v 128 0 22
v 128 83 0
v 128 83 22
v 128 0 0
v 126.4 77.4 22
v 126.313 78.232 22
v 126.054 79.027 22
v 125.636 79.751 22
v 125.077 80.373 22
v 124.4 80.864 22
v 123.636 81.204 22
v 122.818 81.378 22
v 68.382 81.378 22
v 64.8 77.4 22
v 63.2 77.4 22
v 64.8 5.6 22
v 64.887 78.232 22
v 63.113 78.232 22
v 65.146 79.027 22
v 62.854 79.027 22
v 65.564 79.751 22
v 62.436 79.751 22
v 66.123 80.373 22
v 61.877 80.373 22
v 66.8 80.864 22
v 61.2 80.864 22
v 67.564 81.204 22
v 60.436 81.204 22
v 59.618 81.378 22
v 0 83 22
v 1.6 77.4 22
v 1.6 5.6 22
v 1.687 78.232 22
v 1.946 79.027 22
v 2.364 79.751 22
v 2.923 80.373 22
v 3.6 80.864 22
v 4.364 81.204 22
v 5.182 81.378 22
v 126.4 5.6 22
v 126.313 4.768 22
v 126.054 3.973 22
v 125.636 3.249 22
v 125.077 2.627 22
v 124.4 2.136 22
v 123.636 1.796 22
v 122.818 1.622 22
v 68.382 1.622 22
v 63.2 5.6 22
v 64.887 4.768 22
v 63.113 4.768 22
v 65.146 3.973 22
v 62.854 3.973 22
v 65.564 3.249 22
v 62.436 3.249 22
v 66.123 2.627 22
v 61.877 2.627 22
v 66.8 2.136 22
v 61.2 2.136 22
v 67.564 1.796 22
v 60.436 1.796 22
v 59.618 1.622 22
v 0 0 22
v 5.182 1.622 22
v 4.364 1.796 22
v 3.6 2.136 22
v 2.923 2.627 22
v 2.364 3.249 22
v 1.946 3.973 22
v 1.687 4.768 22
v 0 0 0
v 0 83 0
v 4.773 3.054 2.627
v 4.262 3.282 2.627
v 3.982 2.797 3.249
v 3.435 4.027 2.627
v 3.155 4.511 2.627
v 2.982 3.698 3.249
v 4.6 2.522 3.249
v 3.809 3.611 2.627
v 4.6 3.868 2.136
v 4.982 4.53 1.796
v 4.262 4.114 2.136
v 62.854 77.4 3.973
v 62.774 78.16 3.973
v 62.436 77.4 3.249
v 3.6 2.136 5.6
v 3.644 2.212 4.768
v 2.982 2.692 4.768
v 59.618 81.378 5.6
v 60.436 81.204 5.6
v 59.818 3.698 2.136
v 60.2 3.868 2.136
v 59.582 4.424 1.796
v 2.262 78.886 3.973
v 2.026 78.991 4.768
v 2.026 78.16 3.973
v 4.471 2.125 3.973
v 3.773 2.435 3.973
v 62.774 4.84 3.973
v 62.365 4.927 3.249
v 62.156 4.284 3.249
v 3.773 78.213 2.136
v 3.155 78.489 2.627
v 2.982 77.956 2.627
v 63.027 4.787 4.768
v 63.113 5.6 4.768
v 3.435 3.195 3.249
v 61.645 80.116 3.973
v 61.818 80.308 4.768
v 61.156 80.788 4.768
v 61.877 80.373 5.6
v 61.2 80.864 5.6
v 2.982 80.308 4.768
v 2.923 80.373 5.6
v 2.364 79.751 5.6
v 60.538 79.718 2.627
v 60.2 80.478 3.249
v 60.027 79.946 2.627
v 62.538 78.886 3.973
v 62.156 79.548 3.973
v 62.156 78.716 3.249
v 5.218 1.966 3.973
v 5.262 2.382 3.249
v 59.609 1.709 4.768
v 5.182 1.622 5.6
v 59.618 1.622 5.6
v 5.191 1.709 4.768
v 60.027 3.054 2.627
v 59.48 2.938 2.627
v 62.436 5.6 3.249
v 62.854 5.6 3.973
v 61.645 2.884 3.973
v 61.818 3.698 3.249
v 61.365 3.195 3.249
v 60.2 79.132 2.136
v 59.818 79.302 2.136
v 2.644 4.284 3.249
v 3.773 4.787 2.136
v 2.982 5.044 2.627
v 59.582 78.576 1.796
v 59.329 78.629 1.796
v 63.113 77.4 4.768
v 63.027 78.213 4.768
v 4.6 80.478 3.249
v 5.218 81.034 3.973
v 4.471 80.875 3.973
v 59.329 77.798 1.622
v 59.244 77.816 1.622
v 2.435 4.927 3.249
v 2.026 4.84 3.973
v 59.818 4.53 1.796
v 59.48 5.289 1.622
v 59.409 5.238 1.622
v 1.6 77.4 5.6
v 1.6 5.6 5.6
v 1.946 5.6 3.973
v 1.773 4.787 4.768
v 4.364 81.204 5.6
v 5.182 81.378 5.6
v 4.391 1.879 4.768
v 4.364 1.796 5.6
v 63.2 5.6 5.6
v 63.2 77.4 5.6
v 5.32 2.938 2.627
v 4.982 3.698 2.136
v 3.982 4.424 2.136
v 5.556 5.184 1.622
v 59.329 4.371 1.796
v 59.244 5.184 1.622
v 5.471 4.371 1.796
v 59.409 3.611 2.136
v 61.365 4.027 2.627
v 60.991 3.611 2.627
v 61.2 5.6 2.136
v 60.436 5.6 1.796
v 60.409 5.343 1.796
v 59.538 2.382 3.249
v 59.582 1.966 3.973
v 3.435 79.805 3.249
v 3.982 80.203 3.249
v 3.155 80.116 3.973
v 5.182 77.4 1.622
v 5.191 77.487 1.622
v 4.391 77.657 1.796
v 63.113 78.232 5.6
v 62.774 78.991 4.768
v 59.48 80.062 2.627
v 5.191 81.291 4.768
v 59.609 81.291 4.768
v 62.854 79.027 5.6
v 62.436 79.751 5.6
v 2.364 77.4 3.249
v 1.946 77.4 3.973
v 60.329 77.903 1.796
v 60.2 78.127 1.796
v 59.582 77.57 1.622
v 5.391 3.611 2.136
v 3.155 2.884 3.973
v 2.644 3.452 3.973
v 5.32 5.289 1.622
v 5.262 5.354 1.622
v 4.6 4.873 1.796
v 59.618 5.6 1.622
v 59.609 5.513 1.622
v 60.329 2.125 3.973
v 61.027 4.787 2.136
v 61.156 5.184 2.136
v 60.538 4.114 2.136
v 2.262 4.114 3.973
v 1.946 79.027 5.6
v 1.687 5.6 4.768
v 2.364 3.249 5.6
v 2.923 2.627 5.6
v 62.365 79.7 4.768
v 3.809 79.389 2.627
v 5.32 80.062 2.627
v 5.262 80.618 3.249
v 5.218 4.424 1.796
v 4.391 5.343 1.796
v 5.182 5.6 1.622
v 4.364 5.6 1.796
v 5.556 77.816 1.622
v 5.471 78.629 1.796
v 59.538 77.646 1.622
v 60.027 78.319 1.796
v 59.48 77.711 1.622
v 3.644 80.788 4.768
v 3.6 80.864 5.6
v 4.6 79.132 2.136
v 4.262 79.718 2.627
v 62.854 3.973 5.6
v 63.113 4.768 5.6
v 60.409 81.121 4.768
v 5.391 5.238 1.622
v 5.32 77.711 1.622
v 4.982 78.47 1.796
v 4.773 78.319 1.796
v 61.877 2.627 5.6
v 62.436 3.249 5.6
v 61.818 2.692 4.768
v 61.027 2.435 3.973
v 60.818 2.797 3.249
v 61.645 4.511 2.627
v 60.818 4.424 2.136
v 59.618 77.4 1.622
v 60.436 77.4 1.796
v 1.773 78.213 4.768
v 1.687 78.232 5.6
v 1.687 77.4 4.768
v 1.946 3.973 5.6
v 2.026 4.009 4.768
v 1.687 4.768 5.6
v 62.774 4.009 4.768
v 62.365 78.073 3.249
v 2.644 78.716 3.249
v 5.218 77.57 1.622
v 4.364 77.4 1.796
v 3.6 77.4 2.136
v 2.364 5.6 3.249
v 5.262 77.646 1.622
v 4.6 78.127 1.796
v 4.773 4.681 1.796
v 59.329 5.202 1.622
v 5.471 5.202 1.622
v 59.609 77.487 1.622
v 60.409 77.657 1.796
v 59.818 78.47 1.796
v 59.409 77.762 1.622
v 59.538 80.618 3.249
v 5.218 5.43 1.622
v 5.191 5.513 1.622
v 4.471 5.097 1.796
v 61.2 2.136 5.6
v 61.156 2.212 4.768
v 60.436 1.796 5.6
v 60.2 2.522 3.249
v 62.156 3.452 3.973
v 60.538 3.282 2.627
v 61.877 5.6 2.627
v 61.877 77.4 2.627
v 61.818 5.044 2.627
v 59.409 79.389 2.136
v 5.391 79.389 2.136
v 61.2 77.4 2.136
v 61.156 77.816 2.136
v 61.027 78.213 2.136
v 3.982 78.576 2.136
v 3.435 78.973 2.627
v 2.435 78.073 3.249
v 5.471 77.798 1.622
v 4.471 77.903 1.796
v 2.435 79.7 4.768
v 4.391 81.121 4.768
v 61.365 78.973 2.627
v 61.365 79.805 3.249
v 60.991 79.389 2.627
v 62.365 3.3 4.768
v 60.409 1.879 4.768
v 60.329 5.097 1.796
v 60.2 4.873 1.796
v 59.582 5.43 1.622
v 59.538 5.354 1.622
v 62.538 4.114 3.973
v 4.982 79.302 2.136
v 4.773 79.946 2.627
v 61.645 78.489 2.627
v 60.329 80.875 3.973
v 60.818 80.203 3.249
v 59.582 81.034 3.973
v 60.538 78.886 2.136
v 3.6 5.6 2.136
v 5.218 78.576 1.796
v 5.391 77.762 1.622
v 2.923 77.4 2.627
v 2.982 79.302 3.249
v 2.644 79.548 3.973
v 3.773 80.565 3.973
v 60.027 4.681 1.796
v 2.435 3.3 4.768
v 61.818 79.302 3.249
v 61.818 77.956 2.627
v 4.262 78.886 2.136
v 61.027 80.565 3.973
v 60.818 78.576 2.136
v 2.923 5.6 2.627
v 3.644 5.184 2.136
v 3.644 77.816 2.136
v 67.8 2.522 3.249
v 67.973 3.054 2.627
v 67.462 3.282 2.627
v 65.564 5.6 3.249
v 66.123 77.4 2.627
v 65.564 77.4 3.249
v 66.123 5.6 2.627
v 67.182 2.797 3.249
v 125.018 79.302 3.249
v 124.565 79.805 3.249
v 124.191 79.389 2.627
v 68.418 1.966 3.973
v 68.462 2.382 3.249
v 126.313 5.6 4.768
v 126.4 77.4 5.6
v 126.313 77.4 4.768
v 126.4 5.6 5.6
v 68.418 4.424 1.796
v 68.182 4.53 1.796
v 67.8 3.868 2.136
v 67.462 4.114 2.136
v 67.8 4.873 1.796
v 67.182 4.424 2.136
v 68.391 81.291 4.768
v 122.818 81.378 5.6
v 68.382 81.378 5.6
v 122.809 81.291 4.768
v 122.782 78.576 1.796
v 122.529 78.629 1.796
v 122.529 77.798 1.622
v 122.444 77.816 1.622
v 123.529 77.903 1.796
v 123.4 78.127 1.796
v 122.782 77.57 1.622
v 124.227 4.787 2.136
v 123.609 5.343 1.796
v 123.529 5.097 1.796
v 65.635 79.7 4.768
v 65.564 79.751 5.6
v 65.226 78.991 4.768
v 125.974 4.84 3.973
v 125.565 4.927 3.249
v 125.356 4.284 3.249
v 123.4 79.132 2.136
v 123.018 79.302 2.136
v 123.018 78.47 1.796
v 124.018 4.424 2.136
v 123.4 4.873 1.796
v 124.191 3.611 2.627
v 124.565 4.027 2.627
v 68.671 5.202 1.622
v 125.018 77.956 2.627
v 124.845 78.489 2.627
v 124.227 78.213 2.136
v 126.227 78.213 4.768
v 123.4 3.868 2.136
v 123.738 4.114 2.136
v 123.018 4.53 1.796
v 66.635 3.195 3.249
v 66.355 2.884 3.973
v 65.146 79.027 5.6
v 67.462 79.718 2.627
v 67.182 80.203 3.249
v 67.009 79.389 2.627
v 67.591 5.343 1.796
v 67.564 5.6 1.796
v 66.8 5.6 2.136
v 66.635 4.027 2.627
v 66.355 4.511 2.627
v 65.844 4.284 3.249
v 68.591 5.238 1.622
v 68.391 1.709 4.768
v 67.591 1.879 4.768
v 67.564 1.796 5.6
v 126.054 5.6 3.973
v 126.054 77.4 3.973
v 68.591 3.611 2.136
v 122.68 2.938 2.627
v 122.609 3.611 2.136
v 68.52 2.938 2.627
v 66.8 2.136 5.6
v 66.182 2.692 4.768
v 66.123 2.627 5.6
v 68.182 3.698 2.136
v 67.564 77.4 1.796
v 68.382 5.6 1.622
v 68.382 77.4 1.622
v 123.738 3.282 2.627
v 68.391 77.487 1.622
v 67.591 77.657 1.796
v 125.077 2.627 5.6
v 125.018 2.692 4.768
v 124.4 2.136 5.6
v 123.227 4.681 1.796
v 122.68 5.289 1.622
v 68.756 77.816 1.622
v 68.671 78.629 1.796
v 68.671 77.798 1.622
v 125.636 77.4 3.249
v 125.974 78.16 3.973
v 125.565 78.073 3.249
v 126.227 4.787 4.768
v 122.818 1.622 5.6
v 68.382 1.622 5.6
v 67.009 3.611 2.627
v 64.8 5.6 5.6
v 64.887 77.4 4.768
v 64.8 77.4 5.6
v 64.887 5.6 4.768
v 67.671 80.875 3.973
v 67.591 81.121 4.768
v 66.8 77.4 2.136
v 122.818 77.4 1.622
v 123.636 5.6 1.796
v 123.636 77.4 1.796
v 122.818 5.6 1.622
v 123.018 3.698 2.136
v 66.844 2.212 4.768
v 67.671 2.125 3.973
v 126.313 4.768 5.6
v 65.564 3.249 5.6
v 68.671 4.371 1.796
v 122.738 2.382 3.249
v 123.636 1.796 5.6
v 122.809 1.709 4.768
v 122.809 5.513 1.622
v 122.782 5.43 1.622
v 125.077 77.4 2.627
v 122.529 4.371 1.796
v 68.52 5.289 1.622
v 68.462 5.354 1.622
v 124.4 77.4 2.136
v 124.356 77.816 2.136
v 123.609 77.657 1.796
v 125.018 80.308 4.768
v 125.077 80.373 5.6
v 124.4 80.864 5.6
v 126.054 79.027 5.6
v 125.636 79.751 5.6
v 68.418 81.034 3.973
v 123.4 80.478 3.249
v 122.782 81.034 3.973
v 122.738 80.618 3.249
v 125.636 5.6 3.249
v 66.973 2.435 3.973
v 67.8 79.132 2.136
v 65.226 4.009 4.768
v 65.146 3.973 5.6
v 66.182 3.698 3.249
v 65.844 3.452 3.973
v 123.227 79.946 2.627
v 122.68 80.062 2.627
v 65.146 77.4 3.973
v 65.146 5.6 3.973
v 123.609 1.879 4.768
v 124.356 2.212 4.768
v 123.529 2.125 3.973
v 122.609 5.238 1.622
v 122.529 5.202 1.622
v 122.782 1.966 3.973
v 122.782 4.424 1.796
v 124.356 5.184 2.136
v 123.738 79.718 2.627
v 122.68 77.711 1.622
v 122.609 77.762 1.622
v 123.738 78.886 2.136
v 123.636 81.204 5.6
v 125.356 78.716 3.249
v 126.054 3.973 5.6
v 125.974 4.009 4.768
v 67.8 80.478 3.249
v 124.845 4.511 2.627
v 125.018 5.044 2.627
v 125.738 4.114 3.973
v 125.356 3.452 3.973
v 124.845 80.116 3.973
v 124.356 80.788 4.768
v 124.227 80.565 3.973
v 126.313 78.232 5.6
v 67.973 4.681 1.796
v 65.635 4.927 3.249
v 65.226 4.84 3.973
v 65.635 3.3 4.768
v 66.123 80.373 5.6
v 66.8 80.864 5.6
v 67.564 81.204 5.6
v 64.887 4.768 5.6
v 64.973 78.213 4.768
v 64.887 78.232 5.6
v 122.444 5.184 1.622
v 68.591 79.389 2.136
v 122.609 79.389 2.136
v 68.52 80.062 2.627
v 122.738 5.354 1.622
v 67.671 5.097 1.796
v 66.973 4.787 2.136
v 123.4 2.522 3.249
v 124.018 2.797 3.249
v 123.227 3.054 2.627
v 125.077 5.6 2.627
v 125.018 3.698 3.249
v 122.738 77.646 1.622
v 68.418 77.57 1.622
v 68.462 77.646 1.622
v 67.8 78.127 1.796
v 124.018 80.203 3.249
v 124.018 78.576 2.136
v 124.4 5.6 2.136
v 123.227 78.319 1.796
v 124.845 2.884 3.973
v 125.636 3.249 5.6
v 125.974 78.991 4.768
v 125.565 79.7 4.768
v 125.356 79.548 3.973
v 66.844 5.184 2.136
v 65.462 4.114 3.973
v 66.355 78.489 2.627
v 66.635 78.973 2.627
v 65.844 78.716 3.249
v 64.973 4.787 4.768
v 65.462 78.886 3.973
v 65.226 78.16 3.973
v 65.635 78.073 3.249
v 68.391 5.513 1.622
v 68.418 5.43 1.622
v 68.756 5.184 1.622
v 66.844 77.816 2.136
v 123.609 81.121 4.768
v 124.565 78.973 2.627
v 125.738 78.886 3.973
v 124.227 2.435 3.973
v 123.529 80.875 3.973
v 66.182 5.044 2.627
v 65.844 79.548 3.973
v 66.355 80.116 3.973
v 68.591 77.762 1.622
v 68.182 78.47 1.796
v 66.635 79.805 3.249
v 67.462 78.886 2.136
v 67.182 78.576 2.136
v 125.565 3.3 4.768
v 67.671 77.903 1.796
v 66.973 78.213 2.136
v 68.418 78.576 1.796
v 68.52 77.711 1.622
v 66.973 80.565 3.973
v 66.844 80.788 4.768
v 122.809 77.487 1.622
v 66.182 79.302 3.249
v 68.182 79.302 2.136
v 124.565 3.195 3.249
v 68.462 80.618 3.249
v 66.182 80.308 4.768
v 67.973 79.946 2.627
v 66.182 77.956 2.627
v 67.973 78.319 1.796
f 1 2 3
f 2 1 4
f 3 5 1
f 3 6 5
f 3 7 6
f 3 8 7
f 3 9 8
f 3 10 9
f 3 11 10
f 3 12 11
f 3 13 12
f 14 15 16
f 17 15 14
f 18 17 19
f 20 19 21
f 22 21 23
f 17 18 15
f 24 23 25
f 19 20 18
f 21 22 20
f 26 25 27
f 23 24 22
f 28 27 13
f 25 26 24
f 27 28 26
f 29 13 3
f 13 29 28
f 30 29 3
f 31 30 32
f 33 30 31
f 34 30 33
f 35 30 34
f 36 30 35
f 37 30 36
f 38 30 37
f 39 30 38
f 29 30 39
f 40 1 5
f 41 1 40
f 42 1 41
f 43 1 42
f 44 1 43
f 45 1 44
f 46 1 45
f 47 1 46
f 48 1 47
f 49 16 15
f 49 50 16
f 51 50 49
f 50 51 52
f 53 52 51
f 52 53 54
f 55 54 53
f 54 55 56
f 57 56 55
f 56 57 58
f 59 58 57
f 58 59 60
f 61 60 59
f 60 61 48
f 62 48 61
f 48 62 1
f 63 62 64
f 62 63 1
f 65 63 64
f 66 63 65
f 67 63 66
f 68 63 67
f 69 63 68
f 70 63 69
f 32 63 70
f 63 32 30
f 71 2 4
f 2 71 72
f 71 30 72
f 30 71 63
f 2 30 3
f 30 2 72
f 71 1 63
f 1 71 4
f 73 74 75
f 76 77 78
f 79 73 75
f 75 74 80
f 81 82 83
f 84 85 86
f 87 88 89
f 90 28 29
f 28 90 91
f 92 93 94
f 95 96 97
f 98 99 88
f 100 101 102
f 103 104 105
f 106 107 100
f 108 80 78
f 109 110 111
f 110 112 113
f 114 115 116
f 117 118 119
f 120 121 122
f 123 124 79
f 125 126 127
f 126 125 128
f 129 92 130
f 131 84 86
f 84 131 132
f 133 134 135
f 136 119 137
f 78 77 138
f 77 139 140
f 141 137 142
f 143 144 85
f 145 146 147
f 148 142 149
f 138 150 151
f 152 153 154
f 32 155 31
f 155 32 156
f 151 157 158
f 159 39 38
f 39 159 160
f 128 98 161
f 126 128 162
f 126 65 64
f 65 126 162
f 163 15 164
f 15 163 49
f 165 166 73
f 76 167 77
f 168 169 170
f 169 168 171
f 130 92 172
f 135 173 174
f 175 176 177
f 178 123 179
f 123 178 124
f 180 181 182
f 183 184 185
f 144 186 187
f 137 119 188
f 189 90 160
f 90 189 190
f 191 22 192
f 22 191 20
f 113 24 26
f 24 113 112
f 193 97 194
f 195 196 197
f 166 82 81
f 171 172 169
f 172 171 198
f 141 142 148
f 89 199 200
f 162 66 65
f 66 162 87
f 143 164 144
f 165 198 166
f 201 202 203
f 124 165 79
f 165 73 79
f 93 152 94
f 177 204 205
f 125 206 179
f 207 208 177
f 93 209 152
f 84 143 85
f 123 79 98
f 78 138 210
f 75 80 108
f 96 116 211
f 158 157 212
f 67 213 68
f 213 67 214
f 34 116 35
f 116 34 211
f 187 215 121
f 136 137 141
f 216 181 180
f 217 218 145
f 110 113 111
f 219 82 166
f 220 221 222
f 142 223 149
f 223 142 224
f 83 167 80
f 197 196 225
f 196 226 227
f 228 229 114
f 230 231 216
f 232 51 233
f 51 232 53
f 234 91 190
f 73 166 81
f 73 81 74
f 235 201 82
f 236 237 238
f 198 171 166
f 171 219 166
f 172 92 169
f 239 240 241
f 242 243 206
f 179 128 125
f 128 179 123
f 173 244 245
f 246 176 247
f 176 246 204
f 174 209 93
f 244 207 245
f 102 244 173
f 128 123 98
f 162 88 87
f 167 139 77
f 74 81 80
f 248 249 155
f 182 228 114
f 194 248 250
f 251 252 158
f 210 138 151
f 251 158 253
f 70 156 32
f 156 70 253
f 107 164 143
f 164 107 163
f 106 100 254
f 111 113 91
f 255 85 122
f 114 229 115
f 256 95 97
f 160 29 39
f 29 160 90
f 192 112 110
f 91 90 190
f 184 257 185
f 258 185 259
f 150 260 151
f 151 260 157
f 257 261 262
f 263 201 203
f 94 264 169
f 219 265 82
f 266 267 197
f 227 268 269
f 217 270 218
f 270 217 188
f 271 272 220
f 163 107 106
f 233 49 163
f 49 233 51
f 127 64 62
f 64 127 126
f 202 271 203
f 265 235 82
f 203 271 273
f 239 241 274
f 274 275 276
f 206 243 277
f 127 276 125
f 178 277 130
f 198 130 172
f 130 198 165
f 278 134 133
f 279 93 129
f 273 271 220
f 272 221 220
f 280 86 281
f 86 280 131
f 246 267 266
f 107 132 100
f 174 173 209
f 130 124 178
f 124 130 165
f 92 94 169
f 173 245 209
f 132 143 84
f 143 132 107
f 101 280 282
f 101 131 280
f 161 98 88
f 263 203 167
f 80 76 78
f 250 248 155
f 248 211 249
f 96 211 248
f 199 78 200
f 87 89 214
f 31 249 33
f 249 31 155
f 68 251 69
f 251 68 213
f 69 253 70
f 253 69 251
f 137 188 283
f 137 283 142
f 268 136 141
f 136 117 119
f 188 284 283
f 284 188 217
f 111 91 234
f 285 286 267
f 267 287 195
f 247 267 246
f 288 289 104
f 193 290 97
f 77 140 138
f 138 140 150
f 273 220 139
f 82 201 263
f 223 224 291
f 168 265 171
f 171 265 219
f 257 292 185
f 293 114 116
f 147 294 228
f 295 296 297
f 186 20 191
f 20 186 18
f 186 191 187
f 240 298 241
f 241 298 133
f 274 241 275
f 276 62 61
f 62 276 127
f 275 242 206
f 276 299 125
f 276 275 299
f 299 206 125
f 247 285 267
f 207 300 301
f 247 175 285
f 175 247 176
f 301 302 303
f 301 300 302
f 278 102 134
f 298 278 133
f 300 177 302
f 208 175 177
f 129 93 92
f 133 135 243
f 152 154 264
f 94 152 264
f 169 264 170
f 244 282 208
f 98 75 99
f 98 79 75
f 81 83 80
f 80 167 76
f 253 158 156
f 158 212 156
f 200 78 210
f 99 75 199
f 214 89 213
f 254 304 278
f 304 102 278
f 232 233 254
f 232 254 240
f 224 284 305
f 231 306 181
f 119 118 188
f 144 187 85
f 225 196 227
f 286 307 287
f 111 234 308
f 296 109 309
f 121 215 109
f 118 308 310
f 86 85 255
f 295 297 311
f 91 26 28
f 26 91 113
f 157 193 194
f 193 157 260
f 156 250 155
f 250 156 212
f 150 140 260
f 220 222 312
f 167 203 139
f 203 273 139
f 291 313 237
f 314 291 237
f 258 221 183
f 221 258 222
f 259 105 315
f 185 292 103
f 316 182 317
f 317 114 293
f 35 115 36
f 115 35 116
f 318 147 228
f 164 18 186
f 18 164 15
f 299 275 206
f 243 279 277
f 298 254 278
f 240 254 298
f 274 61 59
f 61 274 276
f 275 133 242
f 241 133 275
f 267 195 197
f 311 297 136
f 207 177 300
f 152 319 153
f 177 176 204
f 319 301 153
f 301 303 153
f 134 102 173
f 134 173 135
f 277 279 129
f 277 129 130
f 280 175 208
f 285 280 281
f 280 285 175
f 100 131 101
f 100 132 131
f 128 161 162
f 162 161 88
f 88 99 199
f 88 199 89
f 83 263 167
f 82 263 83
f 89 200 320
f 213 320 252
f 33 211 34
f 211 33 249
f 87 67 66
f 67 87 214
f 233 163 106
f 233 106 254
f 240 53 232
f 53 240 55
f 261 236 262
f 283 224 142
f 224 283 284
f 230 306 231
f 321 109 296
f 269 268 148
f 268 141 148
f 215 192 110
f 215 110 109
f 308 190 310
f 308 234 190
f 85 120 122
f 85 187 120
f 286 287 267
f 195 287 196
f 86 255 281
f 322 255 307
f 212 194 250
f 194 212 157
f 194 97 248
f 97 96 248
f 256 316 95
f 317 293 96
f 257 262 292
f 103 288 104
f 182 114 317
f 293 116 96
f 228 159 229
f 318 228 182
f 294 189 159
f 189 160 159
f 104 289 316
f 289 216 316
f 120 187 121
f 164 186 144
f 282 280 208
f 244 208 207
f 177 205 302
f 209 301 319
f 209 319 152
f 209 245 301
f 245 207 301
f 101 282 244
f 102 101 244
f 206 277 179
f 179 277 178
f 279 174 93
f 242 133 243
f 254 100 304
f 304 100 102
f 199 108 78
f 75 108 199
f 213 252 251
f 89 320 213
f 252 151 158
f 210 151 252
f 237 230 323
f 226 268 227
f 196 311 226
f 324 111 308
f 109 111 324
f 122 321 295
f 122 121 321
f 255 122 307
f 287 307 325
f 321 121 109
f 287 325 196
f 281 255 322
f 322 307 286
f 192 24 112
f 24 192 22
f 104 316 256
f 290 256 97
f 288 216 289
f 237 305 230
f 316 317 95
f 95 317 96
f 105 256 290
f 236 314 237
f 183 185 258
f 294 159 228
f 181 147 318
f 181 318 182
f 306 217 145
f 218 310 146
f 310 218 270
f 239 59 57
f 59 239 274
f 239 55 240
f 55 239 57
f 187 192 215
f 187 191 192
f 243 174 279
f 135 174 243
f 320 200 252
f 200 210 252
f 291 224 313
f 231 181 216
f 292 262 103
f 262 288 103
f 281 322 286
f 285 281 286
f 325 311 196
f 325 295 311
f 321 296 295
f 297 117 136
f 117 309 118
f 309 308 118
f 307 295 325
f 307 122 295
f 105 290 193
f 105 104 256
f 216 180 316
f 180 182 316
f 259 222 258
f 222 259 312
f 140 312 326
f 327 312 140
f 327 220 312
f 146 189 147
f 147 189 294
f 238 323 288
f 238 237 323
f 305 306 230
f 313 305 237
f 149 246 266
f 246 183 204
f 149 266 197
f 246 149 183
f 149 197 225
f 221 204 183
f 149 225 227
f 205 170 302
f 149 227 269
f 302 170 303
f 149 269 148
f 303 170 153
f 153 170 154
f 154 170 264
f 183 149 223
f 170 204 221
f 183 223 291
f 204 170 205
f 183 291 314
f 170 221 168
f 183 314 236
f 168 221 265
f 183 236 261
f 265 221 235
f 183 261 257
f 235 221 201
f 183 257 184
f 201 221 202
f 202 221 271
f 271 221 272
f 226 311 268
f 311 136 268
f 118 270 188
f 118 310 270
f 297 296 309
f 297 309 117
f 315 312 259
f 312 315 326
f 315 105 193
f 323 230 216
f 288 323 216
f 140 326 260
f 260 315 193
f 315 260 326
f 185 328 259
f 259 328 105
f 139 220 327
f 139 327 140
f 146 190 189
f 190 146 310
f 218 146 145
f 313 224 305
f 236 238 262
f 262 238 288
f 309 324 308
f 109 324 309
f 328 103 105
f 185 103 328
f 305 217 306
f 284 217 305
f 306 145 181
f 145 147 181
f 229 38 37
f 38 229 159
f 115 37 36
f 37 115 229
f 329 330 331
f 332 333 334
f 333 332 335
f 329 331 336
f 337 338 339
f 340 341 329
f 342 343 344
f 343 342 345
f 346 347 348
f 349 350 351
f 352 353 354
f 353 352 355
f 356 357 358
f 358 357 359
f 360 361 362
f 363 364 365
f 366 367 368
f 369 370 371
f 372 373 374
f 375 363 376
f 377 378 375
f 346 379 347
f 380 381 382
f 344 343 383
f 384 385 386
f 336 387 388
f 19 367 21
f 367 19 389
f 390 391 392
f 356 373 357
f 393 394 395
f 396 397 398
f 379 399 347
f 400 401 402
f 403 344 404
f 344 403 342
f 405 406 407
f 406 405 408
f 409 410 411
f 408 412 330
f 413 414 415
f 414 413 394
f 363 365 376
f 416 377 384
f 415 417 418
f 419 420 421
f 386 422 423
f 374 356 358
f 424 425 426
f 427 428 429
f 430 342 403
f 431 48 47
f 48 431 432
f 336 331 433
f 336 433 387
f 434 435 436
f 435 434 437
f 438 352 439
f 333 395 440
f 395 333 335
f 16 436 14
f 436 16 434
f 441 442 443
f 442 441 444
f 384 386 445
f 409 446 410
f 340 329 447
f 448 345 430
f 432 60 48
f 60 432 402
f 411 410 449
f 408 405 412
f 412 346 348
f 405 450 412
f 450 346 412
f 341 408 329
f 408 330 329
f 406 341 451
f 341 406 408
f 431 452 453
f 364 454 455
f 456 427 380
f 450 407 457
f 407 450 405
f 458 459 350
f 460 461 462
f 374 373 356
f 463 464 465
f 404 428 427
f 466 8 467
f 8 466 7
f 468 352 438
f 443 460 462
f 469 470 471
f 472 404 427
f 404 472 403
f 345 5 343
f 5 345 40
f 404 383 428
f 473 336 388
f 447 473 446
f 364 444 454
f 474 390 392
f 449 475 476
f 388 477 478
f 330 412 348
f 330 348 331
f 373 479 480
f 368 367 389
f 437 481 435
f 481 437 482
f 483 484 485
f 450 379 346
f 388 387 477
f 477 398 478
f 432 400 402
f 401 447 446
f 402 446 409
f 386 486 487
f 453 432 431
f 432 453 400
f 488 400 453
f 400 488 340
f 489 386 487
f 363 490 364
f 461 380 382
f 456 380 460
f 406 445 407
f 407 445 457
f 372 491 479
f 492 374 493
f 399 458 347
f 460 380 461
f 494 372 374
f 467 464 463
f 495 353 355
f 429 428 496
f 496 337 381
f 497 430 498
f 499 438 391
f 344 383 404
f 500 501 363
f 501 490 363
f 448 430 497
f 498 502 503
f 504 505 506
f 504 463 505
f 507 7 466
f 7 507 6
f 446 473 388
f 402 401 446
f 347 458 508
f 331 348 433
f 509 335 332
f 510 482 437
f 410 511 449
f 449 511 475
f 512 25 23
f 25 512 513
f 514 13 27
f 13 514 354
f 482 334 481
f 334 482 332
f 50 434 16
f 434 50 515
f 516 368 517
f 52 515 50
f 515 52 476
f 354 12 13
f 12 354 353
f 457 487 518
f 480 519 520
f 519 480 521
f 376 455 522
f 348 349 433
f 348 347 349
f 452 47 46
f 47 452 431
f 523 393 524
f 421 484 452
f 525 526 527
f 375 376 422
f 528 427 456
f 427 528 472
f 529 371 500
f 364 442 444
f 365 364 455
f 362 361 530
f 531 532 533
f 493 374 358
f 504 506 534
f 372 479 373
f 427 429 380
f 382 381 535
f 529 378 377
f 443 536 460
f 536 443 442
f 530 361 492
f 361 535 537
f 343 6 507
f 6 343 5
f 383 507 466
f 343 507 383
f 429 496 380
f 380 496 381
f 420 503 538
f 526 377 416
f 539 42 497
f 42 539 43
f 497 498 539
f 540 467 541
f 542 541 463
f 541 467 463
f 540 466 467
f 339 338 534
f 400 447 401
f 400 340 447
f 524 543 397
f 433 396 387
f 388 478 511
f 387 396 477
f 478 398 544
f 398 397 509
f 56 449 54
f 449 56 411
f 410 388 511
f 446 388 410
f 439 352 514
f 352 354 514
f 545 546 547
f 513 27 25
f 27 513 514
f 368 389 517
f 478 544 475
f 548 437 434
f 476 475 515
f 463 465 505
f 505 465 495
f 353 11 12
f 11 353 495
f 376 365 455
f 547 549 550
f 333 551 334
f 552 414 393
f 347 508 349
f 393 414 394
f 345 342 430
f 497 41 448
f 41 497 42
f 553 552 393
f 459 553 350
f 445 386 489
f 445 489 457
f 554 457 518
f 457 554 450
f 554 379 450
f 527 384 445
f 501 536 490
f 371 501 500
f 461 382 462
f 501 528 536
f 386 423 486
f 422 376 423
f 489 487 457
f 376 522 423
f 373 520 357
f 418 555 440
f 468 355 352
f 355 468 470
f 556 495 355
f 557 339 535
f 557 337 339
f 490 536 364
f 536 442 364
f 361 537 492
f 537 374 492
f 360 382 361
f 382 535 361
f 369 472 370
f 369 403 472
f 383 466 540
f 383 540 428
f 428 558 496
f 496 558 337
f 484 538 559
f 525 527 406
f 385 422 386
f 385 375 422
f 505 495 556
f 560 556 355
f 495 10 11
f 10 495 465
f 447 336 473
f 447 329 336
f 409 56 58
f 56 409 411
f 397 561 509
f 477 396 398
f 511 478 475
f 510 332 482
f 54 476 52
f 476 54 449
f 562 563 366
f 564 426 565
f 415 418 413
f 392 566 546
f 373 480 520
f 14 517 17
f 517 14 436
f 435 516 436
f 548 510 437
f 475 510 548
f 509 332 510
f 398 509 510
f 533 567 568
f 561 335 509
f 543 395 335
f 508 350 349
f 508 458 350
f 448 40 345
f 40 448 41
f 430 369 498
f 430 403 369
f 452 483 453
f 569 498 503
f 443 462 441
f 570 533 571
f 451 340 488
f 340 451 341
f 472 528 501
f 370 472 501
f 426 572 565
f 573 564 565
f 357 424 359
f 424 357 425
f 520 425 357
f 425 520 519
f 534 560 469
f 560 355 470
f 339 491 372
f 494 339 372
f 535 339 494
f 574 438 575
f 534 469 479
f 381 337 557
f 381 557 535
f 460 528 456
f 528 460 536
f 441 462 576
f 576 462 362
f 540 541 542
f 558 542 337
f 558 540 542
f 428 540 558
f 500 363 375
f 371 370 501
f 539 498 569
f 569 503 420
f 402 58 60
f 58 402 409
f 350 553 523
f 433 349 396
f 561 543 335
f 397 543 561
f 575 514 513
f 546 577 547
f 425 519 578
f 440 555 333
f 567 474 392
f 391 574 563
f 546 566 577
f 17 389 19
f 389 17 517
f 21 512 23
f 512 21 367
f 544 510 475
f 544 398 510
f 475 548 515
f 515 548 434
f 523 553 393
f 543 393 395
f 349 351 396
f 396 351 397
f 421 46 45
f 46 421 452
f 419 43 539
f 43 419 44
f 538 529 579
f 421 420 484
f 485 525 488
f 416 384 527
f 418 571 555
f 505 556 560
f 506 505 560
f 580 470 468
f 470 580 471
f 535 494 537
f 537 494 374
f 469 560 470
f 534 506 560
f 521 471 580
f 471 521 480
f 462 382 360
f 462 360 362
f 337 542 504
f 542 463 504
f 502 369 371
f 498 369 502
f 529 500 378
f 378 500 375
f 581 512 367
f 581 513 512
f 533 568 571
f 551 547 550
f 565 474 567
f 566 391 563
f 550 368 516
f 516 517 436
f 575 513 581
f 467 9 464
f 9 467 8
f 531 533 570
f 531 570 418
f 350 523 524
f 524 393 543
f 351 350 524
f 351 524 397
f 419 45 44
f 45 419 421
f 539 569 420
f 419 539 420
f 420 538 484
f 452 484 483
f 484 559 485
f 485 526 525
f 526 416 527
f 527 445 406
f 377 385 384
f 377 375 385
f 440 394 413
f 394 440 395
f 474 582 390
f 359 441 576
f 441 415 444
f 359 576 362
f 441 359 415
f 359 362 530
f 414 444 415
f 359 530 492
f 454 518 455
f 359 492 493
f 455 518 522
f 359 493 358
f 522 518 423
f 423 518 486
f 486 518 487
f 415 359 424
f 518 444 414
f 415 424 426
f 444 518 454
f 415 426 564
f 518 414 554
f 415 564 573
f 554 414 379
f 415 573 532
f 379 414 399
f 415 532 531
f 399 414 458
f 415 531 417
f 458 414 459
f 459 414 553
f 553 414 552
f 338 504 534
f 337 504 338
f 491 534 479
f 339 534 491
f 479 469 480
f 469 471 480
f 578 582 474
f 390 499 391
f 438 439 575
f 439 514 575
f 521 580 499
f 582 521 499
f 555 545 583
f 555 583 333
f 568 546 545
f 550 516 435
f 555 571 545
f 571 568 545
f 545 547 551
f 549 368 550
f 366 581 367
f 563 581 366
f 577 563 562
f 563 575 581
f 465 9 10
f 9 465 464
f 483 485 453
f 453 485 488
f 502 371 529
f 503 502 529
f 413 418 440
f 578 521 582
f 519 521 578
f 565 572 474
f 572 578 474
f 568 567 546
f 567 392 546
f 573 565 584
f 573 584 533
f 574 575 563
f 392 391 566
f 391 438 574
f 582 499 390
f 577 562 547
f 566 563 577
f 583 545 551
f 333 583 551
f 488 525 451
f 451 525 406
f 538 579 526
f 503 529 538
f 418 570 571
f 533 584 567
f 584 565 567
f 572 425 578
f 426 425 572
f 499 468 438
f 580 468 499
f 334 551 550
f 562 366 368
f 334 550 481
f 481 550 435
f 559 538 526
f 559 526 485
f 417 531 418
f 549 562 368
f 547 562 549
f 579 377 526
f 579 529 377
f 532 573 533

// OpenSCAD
$fn = 30;

WT = 1.6;
TL = 83;
TH = 22;
TW = 128;

BW = (TW-3*WT)/2;
BL = TL-2*WT;

module RCube(r=2,x,y,z)
{
    hull(){
      translate([r,r,r]) sphere(r);
      translate([x-r,r,r]) sphere(r);
      translate([r,y-r,r]) sphere(r);
      translate([x-r,y-r,r]) sphere(r);
      translate([r,r,z-r]) sphere(r);
      translate([x-r,r,z-r]) sphere(r);
      translate([r,y-r,z-r]) sphere(r);
      translate([x-r,y-r,z-r]) sphere(r);
    }   
}    

difference(){
    cube([TW,TL,TH]); 
    
    translate([WT,WT,WT])RCube(4,BW,BL,30);
    translate([TW-WT-BW,WT,WT])RCube(4,BW,BL,30);
 
 
    
    
}
